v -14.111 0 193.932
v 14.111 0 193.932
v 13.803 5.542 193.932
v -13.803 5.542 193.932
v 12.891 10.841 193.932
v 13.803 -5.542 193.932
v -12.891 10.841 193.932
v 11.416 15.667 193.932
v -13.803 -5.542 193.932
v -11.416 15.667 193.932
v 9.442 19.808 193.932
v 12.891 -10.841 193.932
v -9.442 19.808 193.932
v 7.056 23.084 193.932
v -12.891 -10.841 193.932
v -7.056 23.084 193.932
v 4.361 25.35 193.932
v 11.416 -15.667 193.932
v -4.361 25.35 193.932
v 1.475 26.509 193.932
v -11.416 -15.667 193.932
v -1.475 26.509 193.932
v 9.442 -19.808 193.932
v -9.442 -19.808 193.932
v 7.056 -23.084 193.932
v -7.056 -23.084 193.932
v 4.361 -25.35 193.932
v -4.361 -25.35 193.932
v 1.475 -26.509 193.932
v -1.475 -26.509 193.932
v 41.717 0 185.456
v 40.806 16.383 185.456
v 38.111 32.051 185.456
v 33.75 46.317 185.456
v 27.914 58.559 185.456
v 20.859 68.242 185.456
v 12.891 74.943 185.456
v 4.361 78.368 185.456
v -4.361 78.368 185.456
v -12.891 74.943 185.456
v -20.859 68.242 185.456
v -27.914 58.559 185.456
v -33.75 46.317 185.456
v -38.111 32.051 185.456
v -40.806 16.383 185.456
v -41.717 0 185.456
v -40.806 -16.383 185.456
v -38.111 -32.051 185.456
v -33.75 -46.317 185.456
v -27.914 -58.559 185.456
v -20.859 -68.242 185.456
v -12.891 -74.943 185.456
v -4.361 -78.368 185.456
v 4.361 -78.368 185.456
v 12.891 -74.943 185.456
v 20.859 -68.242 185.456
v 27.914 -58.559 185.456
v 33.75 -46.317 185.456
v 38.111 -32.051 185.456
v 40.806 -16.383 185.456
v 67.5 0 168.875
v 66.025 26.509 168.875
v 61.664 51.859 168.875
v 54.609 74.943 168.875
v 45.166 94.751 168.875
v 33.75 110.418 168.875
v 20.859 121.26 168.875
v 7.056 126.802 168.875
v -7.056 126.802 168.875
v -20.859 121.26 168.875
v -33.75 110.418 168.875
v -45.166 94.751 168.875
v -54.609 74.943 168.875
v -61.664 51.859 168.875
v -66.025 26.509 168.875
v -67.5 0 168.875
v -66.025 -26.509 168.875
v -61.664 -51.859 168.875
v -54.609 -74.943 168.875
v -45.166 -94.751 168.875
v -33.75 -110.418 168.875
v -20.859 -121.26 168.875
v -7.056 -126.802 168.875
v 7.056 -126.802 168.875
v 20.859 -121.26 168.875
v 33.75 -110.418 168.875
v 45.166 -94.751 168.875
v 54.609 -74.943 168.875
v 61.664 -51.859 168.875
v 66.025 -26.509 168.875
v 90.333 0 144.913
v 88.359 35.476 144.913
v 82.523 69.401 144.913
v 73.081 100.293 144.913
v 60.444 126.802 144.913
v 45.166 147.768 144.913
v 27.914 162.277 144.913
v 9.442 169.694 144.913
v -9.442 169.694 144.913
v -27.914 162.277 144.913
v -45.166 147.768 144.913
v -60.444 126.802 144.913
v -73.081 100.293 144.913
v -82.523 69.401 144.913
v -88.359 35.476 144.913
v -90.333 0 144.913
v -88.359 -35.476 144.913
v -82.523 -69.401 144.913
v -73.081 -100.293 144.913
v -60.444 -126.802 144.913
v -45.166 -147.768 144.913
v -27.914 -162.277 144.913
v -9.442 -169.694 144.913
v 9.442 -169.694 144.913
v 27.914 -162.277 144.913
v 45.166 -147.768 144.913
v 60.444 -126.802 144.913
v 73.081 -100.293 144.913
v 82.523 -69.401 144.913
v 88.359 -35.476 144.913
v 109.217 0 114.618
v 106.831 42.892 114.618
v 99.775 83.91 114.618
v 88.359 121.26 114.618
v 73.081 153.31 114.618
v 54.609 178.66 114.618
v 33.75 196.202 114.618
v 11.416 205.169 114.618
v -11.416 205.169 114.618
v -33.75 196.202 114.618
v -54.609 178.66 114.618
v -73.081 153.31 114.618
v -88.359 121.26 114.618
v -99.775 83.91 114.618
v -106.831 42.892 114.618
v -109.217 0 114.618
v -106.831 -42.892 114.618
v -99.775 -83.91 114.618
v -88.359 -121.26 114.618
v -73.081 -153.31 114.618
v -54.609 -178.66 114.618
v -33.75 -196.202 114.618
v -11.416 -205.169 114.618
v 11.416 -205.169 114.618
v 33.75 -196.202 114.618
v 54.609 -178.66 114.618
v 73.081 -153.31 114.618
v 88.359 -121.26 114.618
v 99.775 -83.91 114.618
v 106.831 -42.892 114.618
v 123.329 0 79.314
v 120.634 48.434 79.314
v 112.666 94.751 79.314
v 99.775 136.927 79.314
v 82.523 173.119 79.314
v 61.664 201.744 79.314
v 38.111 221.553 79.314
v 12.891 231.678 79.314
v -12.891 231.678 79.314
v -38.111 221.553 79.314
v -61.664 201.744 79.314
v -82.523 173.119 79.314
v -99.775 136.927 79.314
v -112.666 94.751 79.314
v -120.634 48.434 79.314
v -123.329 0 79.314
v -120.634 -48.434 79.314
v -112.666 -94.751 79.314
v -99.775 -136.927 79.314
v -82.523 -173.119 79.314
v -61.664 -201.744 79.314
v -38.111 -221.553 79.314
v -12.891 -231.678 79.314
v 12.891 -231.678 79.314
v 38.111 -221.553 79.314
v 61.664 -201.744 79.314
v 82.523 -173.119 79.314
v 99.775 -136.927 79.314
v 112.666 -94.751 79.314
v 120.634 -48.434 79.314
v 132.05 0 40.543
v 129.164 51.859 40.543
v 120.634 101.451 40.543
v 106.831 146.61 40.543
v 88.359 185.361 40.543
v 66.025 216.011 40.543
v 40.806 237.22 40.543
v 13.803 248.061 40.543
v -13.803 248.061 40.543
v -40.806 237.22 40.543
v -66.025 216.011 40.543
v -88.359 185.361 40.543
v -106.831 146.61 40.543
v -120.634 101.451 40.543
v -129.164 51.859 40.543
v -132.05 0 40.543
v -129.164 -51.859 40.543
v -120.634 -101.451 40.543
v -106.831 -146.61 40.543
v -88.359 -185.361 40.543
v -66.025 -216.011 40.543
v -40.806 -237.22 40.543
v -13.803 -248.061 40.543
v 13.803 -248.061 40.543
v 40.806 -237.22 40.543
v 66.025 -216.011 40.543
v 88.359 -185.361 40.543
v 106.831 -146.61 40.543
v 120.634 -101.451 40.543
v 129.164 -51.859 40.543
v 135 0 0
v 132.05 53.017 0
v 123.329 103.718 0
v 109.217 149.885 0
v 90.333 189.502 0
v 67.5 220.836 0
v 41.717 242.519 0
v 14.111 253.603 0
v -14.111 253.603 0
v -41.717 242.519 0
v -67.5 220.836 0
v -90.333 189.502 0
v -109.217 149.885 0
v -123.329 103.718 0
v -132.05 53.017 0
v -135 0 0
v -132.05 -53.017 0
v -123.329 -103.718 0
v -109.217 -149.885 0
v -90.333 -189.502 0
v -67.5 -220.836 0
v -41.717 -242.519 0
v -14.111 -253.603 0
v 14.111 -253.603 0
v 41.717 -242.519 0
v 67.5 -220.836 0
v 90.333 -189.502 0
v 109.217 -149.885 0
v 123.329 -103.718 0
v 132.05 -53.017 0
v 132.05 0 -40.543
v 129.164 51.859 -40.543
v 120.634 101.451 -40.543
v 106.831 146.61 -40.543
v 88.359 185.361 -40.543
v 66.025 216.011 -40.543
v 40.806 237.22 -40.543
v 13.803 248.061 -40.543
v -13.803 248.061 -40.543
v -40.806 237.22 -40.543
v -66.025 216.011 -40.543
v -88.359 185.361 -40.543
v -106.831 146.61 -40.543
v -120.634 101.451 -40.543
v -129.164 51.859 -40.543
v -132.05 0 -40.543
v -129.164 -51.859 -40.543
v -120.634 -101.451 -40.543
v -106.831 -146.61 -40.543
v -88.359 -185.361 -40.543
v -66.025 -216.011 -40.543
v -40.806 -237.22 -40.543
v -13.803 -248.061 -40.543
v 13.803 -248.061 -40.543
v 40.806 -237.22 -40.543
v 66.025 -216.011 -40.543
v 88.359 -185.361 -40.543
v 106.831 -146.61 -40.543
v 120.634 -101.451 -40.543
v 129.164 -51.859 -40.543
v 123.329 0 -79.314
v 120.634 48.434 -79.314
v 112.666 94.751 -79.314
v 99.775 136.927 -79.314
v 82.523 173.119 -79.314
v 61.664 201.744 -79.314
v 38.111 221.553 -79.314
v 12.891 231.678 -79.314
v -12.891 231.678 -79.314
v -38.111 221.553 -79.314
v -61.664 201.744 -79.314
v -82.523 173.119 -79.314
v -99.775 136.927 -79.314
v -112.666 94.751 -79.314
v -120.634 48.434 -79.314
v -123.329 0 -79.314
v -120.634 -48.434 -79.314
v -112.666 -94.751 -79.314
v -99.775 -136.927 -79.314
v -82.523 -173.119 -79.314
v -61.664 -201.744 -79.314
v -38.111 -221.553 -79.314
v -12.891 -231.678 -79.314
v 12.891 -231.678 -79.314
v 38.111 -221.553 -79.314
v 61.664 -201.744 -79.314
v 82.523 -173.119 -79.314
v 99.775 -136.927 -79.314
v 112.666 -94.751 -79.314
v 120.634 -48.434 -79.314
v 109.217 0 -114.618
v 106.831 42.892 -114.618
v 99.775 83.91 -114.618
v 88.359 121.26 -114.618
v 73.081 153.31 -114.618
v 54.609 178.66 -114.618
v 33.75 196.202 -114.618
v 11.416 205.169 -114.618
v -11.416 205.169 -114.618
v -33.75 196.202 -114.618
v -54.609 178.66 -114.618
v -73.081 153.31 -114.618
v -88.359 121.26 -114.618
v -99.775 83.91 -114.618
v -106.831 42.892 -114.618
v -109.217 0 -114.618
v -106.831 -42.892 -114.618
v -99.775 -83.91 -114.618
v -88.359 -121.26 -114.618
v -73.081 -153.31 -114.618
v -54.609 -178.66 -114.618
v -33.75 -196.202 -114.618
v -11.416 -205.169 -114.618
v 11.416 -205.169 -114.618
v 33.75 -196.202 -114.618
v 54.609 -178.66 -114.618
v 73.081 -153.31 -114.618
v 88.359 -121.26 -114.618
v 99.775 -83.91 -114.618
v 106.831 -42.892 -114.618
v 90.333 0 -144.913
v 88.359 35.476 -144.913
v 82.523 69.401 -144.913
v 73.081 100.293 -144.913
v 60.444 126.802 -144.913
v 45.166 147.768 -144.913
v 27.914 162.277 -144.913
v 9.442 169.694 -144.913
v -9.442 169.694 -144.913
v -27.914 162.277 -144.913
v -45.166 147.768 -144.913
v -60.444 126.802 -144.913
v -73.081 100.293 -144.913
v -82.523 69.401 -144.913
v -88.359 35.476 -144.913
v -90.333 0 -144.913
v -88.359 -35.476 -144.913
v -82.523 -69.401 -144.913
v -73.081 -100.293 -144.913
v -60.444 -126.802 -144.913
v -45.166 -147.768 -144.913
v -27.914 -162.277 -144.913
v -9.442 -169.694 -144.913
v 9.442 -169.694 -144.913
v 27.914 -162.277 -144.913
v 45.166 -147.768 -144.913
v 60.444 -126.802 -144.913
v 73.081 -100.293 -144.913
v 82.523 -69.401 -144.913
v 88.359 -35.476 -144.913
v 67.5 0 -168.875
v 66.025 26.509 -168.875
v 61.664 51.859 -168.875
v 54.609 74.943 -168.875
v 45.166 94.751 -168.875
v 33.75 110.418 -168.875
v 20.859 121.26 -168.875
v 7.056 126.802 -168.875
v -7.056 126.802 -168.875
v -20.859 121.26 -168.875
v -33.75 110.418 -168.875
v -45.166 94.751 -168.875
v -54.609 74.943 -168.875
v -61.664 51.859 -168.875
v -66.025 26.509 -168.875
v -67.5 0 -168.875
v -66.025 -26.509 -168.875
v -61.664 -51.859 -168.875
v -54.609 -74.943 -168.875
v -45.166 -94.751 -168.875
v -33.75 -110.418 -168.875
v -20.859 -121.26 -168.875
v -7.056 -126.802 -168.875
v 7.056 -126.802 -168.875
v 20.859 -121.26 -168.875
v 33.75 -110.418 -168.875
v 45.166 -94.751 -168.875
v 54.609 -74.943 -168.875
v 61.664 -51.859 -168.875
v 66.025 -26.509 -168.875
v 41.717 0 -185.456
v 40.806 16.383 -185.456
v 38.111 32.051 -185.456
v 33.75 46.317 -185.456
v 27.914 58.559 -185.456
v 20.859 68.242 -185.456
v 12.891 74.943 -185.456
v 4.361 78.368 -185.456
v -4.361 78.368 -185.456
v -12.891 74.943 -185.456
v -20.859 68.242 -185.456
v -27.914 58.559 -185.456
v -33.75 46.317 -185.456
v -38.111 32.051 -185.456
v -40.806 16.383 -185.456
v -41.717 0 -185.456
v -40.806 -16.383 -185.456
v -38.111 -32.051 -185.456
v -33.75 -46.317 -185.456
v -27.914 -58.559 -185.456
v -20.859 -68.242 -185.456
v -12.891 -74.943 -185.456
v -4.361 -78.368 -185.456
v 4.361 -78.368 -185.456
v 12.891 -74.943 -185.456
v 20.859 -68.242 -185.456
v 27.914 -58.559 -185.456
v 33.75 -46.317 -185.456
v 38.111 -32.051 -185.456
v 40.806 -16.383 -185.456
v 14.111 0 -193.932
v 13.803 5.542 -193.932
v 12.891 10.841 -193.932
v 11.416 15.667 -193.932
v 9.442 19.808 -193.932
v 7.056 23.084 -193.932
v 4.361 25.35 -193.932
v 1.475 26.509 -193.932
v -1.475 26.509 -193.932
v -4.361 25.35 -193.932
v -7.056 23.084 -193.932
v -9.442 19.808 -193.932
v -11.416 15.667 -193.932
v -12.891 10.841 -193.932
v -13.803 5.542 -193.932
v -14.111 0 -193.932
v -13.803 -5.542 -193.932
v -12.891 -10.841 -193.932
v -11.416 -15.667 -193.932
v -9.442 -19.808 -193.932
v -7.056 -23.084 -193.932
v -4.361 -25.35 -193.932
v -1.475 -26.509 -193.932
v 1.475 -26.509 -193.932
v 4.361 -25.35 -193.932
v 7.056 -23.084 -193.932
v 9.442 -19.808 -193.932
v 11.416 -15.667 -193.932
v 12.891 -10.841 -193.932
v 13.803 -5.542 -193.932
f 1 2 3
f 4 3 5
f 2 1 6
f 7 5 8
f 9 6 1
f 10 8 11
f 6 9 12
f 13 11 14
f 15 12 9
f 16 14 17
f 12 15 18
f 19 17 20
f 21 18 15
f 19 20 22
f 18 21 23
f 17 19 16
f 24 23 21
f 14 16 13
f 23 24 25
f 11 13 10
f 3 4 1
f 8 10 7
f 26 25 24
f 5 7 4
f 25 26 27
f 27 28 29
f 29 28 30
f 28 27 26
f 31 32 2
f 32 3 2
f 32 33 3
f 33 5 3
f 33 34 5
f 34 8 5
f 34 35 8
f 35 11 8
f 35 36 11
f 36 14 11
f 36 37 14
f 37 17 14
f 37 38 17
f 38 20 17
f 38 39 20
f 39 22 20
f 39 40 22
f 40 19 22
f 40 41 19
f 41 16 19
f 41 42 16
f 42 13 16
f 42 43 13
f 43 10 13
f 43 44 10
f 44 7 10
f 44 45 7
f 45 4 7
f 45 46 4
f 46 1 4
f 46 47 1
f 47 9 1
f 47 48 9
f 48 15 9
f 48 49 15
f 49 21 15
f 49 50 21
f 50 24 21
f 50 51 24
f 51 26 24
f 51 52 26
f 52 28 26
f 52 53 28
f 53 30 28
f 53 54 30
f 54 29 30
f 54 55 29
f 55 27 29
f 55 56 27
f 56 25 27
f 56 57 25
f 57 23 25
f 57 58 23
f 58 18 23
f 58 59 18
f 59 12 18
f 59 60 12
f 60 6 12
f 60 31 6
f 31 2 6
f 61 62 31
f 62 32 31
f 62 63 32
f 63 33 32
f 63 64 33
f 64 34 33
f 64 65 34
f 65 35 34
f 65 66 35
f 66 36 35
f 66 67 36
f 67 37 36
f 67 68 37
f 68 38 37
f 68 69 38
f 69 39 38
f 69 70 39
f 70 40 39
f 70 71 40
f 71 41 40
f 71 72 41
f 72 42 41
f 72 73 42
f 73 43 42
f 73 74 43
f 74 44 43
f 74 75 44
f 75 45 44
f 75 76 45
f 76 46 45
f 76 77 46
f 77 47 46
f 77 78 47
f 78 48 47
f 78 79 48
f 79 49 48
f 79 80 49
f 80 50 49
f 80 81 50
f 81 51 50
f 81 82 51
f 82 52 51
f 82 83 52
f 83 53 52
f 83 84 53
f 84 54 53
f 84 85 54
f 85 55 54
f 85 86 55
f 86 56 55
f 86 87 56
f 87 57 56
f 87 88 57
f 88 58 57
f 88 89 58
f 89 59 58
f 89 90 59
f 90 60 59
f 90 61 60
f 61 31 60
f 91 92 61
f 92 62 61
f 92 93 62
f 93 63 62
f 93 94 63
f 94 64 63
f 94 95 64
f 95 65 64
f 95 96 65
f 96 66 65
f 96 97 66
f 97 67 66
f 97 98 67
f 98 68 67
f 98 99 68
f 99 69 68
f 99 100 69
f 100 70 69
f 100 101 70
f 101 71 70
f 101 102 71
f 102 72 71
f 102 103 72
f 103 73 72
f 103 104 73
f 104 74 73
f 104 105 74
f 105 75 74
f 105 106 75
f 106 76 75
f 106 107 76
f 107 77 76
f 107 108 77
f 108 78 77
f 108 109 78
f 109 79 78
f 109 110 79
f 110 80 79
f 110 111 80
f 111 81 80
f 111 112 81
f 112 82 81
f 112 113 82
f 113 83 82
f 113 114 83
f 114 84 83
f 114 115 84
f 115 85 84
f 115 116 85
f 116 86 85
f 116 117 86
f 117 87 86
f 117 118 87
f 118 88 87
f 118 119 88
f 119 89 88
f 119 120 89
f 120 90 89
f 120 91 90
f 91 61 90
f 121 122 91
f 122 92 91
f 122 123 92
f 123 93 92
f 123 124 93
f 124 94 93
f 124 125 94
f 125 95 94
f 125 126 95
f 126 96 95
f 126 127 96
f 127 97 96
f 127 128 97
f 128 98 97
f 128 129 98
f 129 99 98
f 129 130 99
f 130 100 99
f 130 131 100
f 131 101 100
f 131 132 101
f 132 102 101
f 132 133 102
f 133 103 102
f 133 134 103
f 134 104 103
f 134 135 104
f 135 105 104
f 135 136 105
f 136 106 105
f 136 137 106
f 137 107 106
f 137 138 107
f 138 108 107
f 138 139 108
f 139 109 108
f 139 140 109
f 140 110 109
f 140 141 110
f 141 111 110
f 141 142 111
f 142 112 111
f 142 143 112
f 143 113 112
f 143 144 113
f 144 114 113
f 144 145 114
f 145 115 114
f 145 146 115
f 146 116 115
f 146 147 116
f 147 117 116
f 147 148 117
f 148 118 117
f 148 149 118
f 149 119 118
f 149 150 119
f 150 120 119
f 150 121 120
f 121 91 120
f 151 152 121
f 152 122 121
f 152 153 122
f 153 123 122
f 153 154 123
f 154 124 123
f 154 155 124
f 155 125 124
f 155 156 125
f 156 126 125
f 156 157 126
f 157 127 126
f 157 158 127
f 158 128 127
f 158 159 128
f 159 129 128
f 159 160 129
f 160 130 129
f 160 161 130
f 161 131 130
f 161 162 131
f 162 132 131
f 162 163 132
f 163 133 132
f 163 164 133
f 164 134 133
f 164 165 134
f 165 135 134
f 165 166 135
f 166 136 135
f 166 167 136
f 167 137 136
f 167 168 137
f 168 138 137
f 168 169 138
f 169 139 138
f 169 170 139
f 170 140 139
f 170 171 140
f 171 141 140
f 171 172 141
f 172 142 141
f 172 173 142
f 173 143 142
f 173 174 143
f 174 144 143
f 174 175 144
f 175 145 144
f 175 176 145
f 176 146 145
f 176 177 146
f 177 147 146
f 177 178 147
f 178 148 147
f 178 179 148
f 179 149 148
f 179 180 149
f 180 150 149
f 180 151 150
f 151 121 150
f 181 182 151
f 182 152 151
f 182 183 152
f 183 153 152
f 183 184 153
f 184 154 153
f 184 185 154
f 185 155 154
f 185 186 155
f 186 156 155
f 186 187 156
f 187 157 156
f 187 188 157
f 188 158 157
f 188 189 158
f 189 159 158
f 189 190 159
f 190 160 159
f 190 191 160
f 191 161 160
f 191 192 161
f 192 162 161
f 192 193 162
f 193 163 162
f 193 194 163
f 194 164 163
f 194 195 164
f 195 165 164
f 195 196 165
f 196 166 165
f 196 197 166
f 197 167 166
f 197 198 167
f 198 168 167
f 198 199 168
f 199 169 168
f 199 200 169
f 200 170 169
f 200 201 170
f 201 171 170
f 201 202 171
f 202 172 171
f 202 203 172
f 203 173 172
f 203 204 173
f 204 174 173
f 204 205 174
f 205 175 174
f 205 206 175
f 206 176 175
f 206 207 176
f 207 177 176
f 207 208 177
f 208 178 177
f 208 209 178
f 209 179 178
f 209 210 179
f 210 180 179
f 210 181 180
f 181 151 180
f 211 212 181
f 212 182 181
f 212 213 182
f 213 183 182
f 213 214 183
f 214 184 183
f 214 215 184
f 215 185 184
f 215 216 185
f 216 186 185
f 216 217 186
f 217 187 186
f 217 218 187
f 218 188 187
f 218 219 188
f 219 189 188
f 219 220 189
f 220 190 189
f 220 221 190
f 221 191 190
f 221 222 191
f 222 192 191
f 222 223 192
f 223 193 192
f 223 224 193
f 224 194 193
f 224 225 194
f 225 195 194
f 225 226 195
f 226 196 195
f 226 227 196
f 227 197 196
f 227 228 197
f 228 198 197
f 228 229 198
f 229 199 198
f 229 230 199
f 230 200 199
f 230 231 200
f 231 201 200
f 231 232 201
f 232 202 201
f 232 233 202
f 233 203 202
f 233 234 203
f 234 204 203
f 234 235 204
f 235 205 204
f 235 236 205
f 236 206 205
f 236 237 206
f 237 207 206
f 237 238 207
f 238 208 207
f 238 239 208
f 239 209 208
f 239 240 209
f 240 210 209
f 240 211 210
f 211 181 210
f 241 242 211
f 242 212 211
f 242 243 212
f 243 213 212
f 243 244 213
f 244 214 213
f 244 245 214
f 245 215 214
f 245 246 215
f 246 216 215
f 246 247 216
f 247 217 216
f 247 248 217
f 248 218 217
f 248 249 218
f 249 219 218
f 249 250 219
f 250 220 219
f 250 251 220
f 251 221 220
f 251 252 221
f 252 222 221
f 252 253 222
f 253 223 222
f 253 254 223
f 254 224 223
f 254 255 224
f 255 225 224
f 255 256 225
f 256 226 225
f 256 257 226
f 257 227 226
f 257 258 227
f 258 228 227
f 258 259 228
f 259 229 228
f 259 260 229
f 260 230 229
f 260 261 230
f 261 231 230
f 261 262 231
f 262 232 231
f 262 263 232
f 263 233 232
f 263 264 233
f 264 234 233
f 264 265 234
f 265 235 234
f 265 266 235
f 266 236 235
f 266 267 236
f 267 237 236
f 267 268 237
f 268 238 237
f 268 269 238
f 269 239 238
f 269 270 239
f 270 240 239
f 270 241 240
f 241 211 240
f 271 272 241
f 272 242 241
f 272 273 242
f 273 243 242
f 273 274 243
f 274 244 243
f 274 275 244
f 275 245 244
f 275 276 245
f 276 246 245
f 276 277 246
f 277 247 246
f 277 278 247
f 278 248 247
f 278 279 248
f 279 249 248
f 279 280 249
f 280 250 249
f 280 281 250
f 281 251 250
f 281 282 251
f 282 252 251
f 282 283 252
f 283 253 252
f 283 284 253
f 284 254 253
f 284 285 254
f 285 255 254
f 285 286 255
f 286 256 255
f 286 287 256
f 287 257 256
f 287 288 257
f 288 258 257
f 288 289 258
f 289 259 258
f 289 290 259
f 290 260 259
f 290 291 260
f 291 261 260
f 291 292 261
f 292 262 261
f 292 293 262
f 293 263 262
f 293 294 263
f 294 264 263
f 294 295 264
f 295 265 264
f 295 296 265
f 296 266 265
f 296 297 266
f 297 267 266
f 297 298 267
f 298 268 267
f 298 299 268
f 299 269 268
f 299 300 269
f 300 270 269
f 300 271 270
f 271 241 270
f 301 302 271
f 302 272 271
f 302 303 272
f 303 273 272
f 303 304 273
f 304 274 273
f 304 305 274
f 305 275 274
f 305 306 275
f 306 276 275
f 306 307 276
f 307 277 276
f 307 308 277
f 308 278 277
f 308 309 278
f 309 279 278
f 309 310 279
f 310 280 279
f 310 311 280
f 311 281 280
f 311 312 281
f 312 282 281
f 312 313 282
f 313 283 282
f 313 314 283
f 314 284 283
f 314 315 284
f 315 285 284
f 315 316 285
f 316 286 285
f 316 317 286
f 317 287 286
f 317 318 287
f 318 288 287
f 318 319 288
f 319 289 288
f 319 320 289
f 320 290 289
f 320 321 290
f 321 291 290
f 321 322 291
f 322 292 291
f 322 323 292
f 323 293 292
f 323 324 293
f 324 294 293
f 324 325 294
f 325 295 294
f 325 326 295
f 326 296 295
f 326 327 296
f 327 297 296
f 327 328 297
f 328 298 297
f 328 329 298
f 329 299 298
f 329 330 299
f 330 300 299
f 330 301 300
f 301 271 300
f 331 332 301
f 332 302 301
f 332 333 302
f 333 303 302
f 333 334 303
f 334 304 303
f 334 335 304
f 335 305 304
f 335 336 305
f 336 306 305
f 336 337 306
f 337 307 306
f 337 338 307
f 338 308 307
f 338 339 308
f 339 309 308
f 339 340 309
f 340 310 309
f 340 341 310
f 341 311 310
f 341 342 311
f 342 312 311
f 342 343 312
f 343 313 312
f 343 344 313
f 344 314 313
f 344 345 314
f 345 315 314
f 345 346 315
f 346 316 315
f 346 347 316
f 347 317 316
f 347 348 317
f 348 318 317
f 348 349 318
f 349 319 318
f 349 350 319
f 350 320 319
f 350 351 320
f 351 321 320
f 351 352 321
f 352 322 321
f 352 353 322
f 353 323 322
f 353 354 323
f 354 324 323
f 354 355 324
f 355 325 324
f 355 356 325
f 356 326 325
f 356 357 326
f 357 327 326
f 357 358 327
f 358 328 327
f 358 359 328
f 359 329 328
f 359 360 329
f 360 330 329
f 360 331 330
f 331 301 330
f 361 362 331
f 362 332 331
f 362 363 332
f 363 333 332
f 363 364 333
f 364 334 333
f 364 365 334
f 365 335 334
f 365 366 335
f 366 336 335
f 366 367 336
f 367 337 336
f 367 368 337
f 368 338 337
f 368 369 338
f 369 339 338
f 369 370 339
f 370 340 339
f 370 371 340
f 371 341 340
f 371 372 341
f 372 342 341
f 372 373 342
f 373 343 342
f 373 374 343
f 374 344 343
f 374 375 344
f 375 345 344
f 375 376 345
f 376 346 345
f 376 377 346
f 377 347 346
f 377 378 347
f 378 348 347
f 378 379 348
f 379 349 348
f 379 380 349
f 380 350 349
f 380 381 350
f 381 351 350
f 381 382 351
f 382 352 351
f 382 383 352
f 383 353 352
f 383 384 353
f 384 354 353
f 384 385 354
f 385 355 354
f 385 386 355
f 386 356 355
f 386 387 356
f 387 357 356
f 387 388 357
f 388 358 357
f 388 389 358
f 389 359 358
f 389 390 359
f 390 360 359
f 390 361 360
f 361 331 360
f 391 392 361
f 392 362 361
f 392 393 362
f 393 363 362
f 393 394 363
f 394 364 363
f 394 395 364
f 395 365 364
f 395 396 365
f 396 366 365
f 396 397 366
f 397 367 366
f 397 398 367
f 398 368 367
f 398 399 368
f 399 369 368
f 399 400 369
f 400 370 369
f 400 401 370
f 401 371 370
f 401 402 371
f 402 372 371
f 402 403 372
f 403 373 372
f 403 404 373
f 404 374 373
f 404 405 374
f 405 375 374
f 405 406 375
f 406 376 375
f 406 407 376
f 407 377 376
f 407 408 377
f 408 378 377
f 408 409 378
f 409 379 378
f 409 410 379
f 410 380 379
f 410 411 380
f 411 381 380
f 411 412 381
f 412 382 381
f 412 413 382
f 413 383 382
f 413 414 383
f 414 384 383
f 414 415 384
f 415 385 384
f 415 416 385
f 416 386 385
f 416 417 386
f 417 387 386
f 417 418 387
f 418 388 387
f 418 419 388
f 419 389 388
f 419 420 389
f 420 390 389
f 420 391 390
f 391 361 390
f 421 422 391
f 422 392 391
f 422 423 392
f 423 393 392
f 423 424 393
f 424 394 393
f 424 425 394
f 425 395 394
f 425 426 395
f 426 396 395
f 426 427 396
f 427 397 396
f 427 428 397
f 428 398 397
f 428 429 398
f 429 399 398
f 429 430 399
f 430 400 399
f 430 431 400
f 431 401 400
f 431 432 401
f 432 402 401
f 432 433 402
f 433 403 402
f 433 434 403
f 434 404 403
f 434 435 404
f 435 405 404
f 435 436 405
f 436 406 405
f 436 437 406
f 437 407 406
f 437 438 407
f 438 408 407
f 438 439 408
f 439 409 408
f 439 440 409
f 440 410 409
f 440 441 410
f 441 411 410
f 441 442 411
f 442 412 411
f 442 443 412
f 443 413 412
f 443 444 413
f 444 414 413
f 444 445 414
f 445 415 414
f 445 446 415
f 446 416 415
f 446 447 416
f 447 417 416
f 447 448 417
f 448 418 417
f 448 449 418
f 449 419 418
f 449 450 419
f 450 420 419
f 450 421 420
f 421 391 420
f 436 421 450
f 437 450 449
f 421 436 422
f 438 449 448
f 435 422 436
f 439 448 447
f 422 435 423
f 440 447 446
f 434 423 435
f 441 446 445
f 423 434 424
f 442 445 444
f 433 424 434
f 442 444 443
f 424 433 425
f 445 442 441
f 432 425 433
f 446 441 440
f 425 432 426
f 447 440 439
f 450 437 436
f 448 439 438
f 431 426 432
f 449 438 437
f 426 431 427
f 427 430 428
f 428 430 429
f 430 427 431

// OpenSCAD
// Generated by SolidPython 1.0.1 on 2020-07-29 00:46:49


scale(v = [9, 17, 13]) {
	sphere(r = 15);
}
/***********************************************
*********      SolidPython code:      **********
************************************************
 
# import packages: SolidPython
from solid import *
from solid.utils import *
from itertools import chain, combinations, permutations


class Resize:

    def __init__(self, scad_file):
        self.scad_file = scad_file
        #self.scad_file = import_scad(scad_file)
        # cone/cylinder param:
        self.r1 = 0
        self.r2 = 0
        self.h = 0
        # rectangular prism param:
        self.w = 0
        self.l = 0
        # ellipse param:
        self.r = 0

    # import OpenScad code (file name corresponds to shape)


    # classify shape + parameters
    def assign(self, param1, param2, param3):
        if self.scad_file == 'cone.scad':
            self.r1 = param1
            self.r2 = param2
            self.h = param3
        elif self.scad_file == 'cylinder.scad':
            self.r1 = param1
            self.r2 = param2
            self.h = param3
        elif self.scad_file == 'rectangularPrism.scad':
            self.h = param1
            self.l = param2
            self.w = param3
        else:
            self.r = param1
            self.h = param2

    # resize parameters
    def iterate(self):
        x = range(3, 20, 2)
        i = 1
        if self.scad_file == 'cone.scad':
            tempList = list(permutations(x, 2))
            for temp in tempList:
                param1 = temp[0]
                param2 = temp[1]
                filepath = 'produced_scad_files/' + 'cone' + str(param1) + '_' + str(param2) + '_' + '.scad'
                scad_render_to_file(cylinder(h=param1, r1=param2, r2=0), filepath)

        elif self.scad_file == 'cylinder.scad':
            tempList = list(permutations(x, 3))
            for temp in tempList:
                param1 = temp[0]
                param2 = temp[1]
                filepath = 'produced_scad_files/' + 'cylinder' + str(param1) + '_' + str(param2) + '_' + '.scad'
                scad_render_to_file(cylinder(h=param1, r1=param2, r2=param2), filepath)

        elif self.scad_file == 'rectangularPrism.scad':
            tempList = list(permutations(x, 3))
            for temp in tempList:
                param1 = temp[0]
                param2 = temp[1]
                param3 = temp[2]
                filepath = 'produced_scad_files/' + 'rectangularPrism' + str(param1) + '_' + str(param2) + '_' + str(
                    param3) + '.scad'
                scad_render_to_file(cube(size=(param1, param2, param3)), filepath)

        elif self.scad_file == 'ellipse.scad':
            tempList = list(permutations(x, 4))
            for temp in tempList:
                param1 = temp[0]
                param2 = temp[1]
                param3 = temp[2]
                param4 = temp[3]
                filepath = 'produced_scad_files/' + 'ellipse' + str(param1) + '_' + str(param2) + '_' + str(param3) + '_' + str(param4) + '.scad'
                scad_render_to_file(scale([param1, param2, param3])(sphere(r=param4)), filepath)

    def render_to_scadfile(self):
        scad_render_to_file(scad, 'example.scad') 
 
************************************************/
